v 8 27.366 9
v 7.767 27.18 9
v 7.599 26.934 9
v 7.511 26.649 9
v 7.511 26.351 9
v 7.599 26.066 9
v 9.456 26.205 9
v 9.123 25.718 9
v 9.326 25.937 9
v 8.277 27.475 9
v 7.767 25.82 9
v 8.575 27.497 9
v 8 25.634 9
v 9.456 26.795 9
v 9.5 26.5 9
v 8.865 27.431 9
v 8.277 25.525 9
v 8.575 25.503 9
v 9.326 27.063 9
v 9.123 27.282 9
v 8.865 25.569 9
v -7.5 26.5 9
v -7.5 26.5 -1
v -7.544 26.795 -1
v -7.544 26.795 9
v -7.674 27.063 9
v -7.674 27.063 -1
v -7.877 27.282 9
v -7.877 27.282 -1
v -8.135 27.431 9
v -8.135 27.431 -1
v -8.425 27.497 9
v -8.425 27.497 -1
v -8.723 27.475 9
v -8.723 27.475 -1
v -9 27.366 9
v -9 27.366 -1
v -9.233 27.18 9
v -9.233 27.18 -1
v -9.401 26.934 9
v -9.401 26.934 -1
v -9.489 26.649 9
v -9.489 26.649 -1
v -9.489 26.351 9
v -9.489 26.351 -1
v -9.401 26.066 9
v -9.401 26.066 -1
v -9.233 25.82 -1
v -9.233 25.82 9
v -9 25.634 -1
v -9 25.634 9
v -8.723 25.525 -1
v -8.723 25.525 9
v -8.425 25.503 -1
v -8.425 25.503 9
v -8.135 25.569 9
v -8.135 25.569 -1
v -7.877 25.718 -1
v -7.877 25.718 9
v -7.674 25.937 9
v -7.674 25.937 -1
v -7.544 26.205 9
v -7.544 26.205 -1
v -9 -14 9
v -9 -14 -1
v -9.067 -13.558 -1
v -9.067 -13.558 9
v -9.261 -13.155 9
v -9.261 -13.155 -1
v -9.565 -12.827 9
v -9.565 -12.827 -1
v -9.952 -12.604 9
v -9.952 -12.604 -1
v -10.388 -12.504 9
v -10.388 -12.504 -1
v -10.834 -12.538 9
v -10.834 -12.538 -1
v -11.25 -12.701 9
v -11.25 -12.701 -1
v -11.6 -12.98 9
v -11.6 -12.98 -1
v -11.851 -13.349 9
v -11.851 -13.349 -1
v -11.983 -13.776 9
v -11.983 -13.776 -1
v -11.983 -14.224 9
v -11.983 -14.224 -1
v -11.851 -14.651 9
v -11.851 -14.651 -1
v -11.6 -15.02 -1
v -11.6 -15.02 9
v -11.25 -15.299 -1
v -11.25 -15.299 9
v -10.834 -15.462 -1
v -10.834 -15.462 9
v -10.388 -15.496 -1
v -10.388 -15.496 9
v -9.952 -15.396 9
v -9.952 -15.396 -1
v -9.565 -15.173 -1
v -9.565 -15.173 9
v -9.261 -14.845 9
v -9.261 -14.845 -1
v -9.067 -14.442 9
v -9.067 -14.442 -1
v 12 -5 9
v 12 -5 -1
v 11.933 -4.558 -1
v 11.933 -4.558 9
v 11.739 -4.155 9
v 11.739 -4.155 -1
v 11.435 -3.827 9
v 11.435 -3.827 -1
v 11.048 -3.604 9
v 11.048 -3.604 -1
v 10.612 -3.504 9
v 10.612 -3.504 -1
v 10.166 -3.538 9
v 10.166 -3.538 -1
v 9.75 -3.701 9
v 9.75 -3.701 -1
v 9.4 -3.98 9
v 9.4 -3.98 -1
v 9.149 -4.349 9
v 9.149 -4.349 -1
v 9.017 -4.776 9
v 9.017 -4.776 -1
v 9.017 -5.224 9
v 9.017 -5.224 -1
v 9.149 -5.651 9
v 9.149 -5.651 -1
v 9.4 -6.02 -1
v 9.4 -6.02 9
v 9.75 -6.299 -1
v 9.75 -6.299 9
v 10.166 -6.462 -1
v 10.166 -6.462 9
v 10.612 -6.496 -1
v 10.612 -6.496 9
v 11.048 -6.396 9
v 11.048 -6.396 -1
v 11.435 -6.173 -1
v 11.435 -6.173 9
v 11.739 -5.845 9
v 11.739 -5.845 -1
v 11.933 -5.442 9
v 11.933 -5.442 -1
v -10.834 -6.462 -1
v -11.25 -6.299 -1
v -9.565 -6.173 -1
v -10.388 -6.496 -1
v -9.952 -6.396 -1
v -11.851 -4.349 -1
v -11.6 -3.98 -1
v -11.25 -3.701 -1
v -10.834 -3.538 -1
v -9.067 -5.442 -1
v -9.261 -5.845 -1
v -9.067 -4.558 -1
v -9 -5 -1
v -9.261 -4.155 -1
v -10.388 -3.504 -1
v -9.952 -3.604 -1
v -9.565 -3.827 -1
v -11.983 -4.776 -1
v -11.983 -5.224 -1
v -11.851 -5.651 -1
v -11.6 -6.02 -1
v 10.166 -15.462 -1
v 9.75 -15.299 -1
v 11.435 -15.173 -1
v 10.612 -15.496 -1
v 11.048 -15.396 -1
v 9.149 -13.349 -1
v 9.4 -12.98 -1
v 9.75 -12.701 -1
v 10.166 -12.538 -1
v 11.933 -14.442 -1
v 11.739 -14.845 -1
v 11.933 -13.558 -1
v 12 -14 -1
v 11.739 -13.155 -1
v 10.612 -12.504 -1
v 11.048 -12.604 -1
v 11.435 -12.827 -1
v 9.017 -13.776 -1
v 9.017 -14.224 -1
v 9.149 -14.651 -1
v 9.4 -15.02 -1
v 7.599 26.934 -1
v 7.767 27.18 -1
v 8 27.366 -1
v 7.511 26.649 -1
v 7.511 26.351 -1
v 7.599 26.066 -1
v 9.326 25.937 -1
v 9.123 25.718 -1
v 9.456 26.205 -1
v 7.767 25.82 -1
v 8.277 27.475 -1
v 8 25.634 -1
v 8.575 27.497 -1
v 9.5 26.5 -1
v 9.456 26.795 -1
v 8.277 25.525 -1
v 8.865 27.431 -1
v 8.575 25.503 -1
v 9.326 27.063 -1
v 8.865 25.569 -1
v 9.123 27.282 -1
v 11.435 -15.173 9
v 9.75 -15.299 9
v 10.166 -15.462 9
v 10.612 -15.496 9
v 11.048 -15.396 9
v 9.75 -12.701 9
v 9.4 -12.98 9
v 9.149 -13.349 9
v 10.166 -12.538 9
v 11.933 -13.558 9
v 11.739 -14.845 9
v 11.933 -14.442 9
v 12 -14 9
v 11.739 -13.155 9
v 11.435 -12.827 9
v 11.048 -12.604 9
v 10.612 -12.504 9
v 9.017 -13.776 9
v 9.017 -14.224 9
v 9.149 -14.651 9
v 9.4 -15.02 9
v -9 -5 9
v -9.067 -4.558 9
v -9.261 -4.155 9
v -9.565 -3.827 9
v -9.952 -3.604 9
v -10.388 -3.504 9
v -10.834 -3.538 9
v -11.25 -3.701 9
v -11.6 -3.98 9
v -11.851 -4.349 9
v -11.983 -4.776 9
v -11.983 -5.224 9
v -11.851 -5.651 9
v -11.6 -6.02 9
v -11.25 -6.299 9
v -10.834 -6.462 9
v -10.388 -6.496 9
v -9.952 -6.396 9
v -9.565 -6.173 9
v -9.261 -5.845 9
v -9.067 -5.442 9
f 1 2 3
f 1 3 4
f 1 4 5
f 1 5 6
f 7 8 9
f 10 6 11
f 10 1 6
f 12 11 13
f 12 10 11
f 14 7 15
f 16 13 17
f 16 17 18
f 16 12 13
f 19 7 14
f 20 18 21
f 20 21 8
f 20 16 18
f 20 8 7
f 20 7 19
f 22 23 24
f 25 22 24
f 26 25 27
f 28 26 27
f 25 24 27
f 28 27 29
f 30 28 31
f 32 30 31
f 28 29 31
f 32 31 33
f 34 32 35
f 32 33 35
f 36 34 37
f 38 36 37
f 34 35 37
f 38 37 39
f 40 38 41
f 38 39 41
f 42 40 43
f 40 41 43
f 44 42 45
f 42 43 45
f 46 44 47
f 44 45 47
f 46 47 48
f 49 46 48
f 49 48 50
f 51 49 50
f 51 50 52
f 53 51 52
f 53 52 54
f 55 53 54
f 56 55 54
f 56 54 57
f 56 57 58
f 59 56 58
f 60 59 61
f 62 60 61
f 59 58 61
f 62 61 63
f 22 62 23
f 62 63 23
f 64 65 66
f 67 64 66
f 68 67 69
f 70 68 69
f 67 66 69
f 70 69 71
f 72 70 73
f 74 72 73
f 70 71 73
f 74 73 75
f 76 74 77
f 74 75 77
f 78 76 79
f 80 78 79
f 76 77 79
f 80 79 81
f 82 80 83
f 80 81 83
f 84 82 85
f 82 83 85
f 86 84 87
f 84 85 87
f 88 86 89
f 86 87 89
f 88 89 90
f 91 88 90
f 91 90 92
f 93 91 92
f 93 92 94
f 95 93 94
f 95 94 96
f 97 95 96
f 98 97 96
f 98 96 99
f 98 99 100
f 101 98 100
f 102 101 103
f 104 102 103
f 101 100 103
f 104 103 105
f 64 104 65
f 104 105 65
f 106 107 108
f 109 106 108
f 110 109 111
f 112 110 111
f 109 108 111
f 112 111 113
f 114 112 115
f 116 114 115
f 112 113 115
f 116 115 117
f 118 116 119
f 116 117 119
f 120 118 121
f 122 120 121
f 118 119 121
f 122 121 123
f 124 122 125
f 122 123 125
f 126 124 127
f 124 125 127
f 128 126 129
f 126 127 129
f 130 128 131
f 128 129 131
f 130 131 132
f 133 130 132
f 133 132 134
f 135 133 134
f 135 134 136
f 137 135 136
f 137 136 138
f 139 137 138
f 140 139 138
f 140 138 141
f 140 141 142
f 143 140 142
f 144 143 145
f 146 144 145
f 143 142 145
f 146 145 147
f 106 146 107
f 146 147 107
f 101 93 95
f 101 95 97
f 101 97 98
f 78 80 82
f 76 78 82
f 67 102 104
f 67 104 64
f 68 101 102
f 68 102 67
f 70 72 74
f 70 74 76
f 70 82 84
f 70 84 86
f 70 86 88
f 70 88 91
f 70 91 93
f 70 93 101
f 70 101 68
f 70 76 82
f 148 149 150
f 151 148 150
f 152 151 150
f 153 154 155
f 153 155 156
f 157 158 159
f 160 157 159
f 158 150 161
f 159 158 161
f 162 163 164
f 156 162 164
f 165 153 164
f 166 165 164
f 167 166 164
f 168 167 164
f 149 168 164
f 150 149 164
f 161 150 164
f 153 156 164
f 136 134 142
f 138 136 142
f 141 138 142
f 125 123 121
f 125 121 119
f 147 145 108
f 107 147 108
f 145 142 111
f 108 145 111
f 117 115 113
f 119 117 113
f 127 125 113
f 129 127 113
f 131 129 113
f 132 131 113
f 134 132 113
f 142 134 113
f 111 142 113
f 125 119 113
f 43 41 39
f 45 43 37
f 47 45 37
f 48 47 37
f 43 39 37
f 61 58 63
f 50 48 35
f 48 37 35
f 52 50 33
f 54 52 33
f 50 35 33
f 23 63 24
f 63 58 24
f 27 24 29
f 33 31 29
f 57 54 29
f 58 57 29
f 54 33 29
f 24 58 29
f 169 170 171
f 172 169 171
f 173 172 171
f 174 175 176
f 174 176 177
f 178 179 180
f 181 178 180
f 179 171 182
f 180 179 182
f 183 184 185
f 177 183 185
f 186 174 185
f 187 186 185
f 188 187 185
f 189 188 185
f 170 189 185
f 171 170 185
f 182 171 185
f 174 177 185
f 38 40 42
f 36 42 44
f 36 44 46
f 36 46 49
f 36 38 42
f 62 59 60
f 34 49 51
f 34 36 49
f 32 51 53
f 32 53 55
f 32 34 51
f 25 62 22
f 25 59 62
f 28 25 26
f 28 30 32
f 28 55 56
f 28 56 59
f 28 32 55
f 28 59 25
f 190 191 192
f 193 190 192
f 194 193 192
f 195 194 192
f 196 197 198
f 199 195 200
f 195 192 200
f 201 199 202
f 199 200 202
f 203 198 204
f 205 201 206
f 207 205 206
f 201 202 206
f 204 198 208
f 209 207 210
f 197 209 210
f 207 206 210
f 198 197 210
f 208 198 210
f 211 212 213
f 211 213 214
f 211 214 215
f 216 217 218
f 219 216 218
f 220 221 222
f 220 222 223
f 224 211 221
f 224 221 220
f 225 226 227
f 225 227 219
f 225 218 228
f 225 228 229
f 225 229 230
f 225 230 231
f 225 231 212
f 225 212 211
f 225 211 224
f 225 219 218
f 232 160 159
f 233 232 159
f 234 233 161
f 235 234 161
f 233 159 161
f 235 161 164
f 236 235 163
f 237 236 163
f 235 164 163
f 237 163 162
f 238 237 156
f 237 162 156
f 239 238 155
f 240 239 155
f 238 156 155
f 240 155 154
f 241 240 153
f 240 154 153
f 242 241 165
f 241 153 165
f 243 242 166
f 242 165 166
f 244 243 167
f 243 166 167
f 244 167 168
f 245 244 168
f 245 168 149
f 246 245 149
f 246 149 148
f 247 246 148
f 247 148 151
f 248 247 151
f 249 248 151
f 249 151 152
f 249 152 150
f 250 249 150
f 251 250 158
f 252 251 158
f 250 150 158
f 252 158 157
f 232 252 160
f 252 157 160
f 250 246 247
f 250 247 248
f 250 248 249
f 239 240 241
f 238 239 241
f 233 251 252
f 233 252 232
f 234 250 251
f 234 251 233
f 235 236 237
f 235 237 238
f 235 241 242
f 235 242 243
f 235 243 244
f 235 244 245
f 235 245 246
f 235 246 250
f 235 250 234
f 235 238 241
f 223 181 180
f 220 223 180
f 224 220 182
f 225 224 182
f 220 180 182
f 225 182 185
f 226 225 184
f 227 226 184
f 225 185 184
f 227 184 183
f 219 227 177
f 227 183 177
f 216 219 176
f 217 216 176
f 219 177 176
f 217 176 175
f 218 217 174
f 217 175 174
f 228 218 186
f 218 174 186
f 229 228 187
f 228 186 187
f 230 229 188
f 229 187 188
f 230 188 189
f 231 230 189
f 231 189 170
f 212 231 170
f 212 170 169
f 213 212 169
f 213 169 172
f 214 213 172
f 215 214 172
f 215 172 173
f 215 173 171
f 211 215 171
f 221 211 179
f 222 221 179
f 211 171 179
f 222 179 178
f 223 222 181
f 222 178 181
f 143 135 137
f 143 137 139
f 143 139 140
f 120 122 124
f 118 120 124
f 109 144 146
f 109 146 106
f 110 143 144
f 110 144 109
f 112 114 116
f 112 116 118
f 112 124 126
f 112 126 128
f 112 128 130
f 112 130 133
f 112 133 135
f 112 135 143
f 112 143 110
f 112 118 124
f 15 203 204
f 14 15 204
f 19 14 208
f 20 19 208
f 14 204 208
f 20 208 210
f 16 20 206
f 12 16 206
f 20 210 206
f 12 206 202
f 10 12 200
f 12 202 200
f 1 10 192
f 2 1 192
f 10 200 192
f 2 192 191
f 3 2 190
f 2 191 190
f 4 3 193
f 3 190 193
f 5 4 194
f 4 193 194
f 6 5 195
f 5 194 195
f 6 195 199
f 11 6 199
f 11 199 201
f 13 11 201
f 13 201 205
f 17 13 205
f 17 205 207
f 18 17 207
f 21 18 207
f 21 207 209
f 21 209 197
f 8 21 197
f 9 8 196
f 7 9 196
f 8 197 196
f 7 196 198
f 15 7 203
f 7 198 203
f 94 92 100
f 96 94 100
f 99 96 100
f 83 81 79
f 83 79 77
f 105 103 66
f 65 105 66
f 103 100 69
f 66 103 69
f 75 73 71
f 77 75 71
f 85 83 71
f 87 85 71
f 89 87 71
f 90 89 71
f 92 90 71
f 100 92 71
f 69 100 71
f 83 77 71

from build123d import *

# Parameters (mm, degrees)
CYLINDER035_R     = 1.5
CYLINDER035_DEPTH = 10
CYLINDER036_R     = 1.5
CYLINDER036_DEPTH = 10
CYLINDER037_R     = 1.5
CYLINDER037_DEPTH = 10
CYLINDER038_R     = 1
CYLINDER038_DEPTH = 10
CYLINDER039_R     = 1
CYLINDER039_DEPTH = 10
CYLINDER034_R     = 1.5
CYLINDER034_DEPTH = 10


with BuildPart() as taladro008:
    # Cylinder035 → Cylinder035 (new body)
    with BuildSketch(Plane(origin=(-10.5, -14, -1), x_dir=(1, 0, 0), z_dir=(0, 0, 1))):
        Circle(CYLINDER035_R)
    extrude(amount=CYLINDER035_DEPTH)


with BuildPart() as taladro009:
    # Cylinder036 → Cylinder036 (new body)
    with BuildSketch(Plane(origin=(10.5, -5, -1), x_dir=(1, 0, 0), z_dir=(0, 0, 1))):
        Circle(CYLINDER036_R)
    extrude(amount=CYLINDER036_DEPTH)


with BuildPart() as taladro010:
    # Cylinder037 → Cylinder037 (new body)
    with BuildSketch(Plane(origin=(10.5, -14, -1), x_dir=(1, 0, 0), z_dir=(0, 0, 1))):
        Circle(CYLINDER037_R)
    extrude(amount=CYLINDER037_DEPTH)


with BuildPart() as taladro011:
    # Cylinder038 → Cylinder038 (new body)
    with BuildSketch(Plane(origin=(-8.5, 26.5, -1), x_dir=(1, 0, 0), z_dir=(0, 0, 1))):
        Circle(CYLINDER038_R)
    extrude(amount=CYLINDER038_DEPTH)


with BuildPart() as taladro012:
    # Cylinder039 → Cylinder039 (new body)
    with BuildSketch(Plane(origin=(8.5, 26.5, -1), x_dir=(1, 0, 0), z_dir=(0, 0, 1))):
        Circle(CYLINDER039_R)
    extrude(amount=CYLINDER039_DEPTH)


with BuildPart() as taladros_b:
    # Cylinder034 → Cylinder034 (new body)
    with BuildSketch(Plane(origin=(-10.5, -5, -1), x_dir=(1, 0, 0), z_dir=(0, 0, 1))):
        Circle(CYLINDER034_R)
    extrude(amount=CYLINDER034_DEPTH)

    # Fusion015: union Taladro008, Taladro009, Taladro010, Taladro011, Taladro012
    add(taladro008.part)
    add(taladro009.part)
    add(taladro010.part)
    add(taladro011.part)
    add(taladro012.part)


solid = taladros_b.part
